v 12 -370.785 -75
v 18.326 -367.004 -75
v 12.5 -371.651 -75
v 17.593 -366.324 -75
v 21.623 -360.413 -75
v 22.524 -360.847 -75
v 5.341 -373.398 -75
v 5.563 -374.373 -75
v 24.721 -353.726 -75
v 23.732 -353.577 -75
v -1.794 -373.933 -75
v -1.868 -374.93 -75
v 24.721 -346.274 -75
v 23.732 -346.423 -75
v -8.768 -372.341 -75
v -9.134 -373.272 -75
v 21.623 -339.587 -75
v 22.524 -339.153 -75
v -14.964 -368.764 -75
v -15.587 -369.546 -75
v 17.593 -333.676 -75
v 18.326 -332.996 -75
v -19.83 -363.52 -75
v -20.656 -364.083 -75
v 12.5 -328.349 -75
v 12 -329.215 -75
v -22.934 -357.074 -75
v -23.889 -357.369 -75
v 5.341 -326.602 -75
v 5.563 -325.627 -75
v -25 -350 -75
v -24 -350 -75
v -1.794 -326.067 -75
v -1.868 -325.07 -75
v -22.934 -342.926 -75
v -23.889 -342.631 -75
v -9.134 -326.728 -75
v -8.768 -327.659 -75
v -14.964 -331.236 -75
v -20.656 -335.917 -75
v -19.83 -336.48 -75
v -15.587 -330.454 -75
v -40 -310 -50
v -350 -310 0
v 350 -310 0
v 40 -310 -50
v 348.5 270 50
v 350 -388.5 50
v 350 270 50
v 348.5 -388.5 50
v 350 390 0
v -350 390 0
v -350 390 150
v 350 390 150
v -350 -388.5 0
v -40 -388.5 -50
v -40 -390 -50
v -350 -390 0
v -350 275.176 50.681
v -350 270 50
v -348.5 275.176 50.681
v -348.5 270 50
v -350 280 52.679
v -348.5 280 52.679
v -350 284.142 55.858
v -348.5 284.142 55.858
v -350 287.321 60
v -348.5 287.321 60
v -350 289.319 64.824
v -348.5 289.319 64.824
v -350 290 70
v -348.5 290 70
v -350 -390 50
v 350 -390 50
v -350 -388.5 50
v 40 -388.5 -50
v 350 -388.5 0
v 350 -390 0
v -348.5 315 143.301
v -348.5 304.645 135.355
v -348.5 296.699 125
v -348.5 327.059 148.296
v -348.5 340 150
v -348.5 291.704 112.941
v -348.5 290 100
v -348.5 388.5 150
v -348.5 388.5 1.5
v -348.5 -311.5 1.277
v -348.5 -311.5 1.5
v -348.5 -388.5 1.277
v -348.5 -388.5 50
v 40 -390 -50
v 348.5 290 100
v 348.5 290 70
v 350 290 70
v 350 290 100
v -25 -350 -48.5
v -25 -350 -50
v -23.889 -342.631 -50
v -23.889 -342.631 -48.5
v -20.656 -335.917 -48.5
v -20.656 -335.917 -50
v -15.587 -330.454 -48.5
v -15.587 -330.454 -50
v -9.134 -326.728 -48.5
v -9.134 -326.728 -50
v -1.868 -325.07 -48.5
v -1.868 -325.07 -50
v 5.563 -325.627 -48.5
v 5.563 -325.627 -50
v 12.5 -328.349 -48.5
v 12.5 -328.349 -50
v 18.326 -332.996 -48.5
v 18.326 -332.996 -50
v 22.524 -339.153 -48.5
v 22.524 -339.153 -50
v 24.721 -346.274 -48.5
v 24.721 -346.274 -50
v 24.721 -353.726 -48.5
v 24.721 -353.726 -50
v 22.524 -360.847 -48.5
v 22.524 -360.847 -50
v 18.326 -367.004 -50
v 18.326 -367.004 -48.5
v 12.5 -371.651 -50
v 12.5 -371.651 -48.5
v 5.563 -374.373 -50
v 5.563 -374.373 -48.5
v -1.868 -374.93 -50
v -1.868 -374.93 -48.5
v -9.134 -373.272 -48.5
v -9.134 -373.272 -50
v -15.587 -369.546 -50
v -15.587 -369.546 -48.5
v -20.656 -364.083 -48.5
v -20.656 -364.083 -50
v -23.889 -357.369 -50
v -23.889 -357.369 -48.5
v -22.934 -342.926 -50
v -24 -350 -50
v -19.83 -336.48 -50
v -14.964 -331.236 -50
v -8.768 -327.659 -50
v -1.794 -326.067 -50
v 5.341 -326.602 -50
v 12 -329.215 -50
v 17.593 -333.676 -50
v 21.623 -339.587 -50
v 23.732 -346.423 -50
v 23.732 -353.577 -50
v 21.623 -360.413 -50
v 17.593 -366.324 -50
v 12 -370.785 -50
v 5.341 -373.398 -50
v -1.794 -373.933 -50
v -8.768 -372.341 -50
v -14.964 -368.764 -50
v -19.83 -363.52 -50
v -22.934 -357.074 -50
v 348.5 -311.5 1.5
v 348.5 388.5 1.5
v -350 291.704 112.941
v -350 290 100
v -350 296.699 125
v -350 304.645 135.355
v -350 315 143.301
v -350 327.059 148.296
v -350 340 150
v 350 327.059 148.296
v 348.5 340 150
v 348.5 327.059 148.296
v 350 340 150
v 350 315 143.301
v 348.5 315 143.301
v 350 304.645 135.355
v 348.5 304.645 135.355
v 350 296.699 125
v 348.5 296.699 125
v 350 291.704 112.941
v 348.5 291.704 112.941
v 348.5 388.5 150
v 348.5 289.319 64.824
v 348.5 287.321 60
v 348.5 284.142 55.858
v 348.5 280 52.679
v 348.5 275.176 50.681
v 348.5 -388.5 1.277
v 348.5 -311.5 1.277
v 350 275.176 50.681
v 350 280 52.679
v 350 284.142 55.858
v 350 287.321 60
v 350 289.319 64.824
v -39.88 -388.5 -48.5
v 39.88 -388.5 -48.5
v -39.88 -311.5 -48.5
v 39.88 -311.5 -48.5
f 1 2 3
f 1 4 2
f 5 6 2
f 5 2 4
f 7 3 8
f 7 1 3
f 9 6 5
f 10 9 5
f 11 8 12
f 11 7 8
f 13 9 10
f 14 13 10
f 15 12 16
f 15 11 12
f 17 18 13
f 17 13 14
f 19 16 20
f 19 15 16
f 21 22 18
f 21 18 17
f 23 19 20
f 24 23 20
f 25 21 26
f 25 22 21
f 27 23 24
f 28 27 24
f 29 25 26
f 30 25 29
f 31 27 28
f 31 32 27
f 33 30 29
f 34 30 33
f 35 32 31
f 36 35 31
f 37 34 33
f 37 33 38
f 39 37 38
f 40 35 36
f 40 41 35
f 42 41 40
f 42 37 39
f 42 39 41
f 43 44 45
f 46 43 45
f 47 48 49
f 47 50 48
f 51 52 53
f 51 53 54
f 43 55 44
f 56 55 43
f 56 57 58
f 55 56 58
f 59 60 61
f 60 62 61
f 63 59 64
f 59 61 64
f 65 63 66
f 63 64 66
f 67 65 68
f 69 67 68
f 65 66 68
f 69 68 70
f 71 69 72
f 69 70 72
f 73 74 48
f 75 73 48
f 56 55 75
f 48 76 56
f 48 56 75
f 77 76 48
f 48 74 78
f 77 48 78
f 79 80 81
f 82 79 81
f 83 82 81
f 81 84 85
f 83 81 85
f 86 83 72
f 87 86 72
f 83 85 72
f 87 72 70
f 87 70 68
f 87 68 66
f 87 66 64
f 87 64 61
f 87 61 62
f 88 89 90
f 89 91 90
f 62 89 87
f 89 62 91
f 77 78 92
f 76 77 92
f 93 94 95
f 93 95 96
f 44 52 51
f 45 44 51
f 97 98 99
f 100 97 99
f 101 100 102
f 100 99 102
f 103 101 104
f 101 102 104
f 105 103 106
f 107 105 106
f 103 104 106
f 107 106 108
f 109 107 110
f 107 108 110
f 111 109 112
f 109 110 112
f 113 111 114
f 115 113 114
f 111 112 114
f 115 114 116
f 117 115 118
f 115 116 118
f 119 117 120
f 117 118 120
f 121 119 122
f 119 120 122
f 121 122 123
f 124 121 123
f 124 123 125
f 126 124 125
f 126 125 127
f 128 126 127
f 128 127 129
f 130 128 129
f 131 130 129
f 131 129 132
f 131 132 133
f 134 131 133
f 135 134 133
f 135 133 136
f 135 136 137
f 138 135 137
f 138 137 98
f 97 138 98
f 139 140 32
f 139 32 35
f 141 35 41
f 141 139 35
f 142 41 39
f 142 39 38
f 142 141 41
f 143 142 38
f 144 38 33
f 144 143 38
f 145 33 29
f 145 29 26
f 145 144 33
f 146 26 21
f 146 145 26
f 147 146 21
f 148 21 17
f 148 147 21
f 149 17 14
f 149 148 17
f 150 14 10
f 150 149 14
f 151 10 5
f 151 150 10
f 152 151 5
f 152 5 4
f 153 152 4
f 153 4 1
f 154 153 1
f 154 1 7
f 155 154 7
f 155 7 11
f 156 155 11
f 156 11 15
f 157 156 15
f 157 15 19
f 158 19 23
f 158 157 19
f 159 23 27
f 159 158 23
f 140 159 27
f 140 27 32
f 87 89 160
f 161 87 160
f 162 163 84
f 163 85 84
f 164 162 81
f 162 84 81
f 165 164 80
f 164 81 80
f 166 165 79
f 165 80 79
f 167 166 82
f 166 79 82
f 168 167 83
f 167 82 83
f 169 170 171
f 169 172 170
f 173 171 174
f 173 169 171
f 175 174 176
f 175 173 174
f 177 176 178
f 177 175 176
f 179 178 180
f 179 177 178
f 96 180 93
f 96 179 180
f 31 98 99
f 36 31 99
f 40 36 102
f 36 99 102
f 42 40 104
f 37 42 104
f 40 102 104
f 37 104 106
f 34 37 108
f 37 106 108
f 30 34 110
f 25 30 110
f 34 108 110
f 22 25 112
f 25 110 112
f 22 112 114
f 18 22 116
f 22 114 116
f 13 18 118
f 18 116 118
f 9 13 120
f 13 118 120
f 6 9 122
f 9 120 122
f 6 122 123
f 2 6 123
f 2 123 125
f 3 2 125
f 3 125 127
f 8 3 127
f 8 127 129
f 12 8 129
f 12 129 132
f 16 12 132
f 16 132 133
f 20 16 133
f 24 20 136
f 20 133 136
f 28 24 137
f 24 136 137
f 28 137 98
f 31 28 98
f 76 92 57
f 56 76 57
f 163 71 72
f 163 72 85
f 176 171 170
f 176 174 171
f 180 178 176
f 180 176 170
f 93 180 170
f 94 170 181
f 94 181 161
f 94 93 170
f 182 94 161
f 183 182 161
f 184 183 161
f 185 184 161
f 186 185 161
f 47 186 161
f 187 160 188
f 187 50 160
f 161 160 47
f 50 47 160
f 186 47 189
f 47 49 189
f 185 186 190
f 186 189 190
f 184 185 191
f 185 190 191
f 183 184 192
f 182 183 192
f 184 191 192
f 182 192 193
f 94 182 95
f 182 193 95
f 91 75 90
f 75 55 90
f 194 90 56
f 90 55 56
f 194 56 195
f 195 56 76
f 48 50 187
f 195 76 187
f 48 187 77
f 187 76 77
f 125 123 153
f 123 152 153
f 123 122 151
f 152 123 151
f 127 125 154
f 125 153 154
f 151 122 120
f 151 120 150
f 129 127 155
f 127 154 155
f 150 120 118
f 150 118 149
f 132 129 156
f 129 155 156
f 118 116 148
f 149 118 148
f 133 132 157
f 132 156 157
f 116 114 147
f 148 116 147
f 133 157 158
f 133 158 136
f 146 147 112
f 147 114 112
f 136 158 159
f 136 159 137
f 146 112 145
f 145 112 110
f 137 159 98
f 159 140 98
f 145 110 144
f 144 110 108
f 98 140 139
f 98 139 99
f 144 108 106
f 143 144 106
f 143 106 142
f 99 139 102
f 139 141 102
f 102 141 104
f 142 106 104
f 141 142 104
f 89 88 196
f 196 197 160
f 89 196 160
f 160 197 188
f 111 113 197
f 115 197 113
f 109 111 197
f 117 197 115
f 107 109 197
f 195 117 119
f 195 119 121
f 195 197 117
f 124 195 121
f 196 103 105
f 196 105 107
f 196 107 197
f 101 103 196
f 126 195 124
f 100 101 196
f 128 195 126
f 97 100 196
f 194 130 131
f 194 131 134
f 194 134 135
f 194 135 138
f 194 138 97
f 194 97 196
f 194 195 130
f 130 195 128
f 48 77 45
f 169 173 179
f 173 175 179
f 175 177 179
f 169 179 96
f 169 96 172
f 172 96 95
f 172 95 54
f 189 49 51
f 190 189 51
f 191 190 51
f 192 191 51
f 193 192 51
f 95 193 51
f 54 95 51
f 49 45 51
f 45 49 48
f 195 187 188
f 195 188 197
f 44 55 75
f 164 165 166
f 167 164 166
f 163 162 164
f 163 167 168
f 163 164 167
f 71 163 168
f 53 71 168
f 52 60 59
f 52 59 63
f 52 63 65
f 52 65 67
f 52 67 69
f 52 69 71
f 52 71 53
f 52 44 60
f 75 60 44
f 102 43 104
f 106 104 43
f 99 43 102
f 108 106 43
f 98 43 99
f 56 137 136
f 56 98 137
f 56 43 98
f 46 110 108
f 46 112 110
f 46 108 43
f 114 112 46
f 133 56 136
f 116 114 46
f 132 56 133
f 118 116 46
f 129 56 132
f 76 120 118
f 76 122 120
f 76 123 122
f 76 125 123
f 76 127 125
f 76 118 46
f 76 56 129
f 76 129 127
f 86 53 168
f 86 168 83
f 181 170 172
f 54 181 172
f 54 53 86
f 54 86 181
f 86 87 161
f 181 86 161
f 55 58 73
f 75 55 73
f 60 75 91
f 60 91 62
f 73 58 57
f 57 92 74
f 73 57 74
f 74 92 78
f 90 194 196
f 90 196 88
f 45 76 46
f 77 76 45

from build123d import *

# Parameters (mm, degrees)
SKETCH_6_W                 = 700
SKETCH_6_H                 = 780
EXTRUDE_2_DEPTH            = 150
EXTRUDE_4_DEPTH            = 80
SHELL_START                = -388.5
SHELL_2_OUTLINE_W          = 697
SHELL_2_OUTLINE_H          = 148.5
SHELL_2_DEPTH              = 777
SHELL_2_2_DEPTH            = 77
SKETCH_13_R                = 25
CUT_EXTRUDE_1_DEPTH        = 561.892146495
SPLIT_START                = -390
SPLIT_BODIES_5_DEPTH       = 1.5
SPLIT_BODIES_5_2_OUTLINE_W = 702
SPLIT_BODIES_5_2_OUTLINE_H = 203
SPLIT_BODIES_5_2_DEPTH     = 1.5
SKETCH_15_W                = 200.791070075
SKETCH_15_H                = 716.3886285
CUT_EXTRUDE_2_DEPTH        = 816.230028888
FILLET_1_R                 = 20
FILLET_2_R                 = 50
SKETCH_16_R                = 25
SKETCH_16_R_2              = 24
EXTRUDE_5_DEPTH            = 25


# Read off the part's stored shape, not the designer's step: 抽壳2, 分割5
with BuildPart() as part:
    # 草图6 → 凸台-拉伸2 (new body)
    with BuildSketch(Plane.XY):
        Rectangle(SKETCH_6_W, SKETCH_6_H)
    extrude(amount=EXTRUDE_2_DEPTH)

    # 草图8 → 凸台-拉伸4 (add)
    with BuildSketch(Plane.XZ.offset(390)):
        Polygon((-350, 0), (-40, -50), (40, -50), (350, 0), align=None)
    extrude(amount=-EXTRUDE_4_DEPTH)

    # 抽壳2 outline → 抽壳2 (cut)
    with BuildSketch(Plane(origin=(0, 0, 0), x_dir=(1, 0, 0), z_dir=(0, 1, 0)).offset(SHELL_START)):
        with Locations((0, -75.75)):
            Rectangle(SHELL_2_OUTLINE_W, SHELL_2_OUTLINE_H)
    extrude(amount=SHELL_2_DEPTH, mode=Mode.SUBTRACT)

    # Shell 2 2 outline → Shell 2 2 (cut)
    with BuildSketch(Plane(origin=(0, 0, 0), x_dir=(1, 0, 0), z_dir=(0, 1, 0)).offset(SHELL_START)):
        Polygon((-348.5, -1.5), (348.5, -1.5), (348.5, -1.277450174), (39.879808919, 48.5), (-39.879808919, 48.5), (-348.5, -1.277450174), align=None)
    extrude(amount=SHELL_2_2_DEPTH, mode=Mode.SUBTRACT)

    # 草图13 → 切除-拉伸1 (cut, through all)
    with BuildSketch(Plane(origin=(0, 0, -50), x_dir=(-1, 0, 0), z_dir=(0, 0, -1))):
        with Locations((0, -350)):
            Circle(SKETCH_13_R)
    extrude(amount=-CUT_EXTRUDE_1_DEPTH, mode=Mode.SUBTRACT)

    # Split Bodies 5 2 outline → Split Bodies 5 2 (cut)
    with BuildSketch(Plane(origin=(0, 0, 0), x_dir=(1, 0, 0), z_dir=(0, 1, 0)).offset(SPLIT_START)):
        with Locations((0, -49.5)):
            Rectangle(SPLIT_BODIES_5_2_OUTLINE_W, SPLIT_BODIES_5_2_OUTLINE_H)
    extrude(amount=SPLIT_BODIES_5_2_DEPTH, mode=Mode.SUBTRACT)


with BuildPart() as body_2:
    # Split Bodies 5 outline → Split Bodies 5 (new body)
    with BuildSketch(Plane(origin=(0, 0, 0), x_dir=(1, 0, 0), z_dir=(0, 1, 0)).offset(SPLIT_START)):
        Polygon((-350, -150), (350, -150), (350, 0), (40, 50), (-40, 50), (-350, 0), align=None)
    extrude(amount=SPLIT_BODIES_5_DEPTH)


with BuildPart() as cut_extrude_2_tool:
    # 草图15 → 切除-拉伸2 (new, through all)
    with BuildSketch(Plane.ZY.offset(350)):
        with Locations((150.395535037, -68.19431425)):
            Rectangle(SKETCH_15_W, SKETCH_15_H)
    extrude(amount=-CUT_EXTRUDE_2_DEPTH)


with BuildPart() as part_1:
    add(part.part)

    # 切除-拉伸2: cut by cut_extrude_2_tool
    add(cut_extrude_2_tool.part, mode=Mode.SUBTRACT)

    # 圆角1
    fillet_1_edges = [part_1.edges().sort_by_distance(p)[0] for p in [
        (-349.25, 290, 50),
        (349.25, 290, 50),
    ]]
    fillet(fillet_1_edges, radius=FILLET_1_R)

    # 圆角2
    fillet_2_edges = [part_1.edges().sort_by_distance(p)[0] for p in [
        (-349.25, 290, 150),
        (349.25, 290, 150),
    ]]
    fillet(fillet_2_edges, radius=FILLET_2_R)


with BuildPart() as body_2_1:
    add(body_2.part)

    # 切除-拉伸2: cut by cut_extrude_2_tool
    add(cut_extrude_2_tool.part, mode=Mode.SUBTRACT)


with BuildPart() as body_3:
    # 草图16 → 凸台-拉伸5 (new body)
    with BuildSketch(Plane(origin=(0, 0, -50), x_dir=(-1, 0, 0), z_dir=(0, 0, -1))):
        with Locations((0, -350)):
            Circle(SKETCH_16_R)
        with Locations((0, -350)):
            Circle(SKETCH_16_R_2, mode=Mode.SUBTRACT)
    extrude(amount=EXTRUDE_5_DEPTH)


solid = Compound([part_1.part, body_2_1.part, body_3.part])
